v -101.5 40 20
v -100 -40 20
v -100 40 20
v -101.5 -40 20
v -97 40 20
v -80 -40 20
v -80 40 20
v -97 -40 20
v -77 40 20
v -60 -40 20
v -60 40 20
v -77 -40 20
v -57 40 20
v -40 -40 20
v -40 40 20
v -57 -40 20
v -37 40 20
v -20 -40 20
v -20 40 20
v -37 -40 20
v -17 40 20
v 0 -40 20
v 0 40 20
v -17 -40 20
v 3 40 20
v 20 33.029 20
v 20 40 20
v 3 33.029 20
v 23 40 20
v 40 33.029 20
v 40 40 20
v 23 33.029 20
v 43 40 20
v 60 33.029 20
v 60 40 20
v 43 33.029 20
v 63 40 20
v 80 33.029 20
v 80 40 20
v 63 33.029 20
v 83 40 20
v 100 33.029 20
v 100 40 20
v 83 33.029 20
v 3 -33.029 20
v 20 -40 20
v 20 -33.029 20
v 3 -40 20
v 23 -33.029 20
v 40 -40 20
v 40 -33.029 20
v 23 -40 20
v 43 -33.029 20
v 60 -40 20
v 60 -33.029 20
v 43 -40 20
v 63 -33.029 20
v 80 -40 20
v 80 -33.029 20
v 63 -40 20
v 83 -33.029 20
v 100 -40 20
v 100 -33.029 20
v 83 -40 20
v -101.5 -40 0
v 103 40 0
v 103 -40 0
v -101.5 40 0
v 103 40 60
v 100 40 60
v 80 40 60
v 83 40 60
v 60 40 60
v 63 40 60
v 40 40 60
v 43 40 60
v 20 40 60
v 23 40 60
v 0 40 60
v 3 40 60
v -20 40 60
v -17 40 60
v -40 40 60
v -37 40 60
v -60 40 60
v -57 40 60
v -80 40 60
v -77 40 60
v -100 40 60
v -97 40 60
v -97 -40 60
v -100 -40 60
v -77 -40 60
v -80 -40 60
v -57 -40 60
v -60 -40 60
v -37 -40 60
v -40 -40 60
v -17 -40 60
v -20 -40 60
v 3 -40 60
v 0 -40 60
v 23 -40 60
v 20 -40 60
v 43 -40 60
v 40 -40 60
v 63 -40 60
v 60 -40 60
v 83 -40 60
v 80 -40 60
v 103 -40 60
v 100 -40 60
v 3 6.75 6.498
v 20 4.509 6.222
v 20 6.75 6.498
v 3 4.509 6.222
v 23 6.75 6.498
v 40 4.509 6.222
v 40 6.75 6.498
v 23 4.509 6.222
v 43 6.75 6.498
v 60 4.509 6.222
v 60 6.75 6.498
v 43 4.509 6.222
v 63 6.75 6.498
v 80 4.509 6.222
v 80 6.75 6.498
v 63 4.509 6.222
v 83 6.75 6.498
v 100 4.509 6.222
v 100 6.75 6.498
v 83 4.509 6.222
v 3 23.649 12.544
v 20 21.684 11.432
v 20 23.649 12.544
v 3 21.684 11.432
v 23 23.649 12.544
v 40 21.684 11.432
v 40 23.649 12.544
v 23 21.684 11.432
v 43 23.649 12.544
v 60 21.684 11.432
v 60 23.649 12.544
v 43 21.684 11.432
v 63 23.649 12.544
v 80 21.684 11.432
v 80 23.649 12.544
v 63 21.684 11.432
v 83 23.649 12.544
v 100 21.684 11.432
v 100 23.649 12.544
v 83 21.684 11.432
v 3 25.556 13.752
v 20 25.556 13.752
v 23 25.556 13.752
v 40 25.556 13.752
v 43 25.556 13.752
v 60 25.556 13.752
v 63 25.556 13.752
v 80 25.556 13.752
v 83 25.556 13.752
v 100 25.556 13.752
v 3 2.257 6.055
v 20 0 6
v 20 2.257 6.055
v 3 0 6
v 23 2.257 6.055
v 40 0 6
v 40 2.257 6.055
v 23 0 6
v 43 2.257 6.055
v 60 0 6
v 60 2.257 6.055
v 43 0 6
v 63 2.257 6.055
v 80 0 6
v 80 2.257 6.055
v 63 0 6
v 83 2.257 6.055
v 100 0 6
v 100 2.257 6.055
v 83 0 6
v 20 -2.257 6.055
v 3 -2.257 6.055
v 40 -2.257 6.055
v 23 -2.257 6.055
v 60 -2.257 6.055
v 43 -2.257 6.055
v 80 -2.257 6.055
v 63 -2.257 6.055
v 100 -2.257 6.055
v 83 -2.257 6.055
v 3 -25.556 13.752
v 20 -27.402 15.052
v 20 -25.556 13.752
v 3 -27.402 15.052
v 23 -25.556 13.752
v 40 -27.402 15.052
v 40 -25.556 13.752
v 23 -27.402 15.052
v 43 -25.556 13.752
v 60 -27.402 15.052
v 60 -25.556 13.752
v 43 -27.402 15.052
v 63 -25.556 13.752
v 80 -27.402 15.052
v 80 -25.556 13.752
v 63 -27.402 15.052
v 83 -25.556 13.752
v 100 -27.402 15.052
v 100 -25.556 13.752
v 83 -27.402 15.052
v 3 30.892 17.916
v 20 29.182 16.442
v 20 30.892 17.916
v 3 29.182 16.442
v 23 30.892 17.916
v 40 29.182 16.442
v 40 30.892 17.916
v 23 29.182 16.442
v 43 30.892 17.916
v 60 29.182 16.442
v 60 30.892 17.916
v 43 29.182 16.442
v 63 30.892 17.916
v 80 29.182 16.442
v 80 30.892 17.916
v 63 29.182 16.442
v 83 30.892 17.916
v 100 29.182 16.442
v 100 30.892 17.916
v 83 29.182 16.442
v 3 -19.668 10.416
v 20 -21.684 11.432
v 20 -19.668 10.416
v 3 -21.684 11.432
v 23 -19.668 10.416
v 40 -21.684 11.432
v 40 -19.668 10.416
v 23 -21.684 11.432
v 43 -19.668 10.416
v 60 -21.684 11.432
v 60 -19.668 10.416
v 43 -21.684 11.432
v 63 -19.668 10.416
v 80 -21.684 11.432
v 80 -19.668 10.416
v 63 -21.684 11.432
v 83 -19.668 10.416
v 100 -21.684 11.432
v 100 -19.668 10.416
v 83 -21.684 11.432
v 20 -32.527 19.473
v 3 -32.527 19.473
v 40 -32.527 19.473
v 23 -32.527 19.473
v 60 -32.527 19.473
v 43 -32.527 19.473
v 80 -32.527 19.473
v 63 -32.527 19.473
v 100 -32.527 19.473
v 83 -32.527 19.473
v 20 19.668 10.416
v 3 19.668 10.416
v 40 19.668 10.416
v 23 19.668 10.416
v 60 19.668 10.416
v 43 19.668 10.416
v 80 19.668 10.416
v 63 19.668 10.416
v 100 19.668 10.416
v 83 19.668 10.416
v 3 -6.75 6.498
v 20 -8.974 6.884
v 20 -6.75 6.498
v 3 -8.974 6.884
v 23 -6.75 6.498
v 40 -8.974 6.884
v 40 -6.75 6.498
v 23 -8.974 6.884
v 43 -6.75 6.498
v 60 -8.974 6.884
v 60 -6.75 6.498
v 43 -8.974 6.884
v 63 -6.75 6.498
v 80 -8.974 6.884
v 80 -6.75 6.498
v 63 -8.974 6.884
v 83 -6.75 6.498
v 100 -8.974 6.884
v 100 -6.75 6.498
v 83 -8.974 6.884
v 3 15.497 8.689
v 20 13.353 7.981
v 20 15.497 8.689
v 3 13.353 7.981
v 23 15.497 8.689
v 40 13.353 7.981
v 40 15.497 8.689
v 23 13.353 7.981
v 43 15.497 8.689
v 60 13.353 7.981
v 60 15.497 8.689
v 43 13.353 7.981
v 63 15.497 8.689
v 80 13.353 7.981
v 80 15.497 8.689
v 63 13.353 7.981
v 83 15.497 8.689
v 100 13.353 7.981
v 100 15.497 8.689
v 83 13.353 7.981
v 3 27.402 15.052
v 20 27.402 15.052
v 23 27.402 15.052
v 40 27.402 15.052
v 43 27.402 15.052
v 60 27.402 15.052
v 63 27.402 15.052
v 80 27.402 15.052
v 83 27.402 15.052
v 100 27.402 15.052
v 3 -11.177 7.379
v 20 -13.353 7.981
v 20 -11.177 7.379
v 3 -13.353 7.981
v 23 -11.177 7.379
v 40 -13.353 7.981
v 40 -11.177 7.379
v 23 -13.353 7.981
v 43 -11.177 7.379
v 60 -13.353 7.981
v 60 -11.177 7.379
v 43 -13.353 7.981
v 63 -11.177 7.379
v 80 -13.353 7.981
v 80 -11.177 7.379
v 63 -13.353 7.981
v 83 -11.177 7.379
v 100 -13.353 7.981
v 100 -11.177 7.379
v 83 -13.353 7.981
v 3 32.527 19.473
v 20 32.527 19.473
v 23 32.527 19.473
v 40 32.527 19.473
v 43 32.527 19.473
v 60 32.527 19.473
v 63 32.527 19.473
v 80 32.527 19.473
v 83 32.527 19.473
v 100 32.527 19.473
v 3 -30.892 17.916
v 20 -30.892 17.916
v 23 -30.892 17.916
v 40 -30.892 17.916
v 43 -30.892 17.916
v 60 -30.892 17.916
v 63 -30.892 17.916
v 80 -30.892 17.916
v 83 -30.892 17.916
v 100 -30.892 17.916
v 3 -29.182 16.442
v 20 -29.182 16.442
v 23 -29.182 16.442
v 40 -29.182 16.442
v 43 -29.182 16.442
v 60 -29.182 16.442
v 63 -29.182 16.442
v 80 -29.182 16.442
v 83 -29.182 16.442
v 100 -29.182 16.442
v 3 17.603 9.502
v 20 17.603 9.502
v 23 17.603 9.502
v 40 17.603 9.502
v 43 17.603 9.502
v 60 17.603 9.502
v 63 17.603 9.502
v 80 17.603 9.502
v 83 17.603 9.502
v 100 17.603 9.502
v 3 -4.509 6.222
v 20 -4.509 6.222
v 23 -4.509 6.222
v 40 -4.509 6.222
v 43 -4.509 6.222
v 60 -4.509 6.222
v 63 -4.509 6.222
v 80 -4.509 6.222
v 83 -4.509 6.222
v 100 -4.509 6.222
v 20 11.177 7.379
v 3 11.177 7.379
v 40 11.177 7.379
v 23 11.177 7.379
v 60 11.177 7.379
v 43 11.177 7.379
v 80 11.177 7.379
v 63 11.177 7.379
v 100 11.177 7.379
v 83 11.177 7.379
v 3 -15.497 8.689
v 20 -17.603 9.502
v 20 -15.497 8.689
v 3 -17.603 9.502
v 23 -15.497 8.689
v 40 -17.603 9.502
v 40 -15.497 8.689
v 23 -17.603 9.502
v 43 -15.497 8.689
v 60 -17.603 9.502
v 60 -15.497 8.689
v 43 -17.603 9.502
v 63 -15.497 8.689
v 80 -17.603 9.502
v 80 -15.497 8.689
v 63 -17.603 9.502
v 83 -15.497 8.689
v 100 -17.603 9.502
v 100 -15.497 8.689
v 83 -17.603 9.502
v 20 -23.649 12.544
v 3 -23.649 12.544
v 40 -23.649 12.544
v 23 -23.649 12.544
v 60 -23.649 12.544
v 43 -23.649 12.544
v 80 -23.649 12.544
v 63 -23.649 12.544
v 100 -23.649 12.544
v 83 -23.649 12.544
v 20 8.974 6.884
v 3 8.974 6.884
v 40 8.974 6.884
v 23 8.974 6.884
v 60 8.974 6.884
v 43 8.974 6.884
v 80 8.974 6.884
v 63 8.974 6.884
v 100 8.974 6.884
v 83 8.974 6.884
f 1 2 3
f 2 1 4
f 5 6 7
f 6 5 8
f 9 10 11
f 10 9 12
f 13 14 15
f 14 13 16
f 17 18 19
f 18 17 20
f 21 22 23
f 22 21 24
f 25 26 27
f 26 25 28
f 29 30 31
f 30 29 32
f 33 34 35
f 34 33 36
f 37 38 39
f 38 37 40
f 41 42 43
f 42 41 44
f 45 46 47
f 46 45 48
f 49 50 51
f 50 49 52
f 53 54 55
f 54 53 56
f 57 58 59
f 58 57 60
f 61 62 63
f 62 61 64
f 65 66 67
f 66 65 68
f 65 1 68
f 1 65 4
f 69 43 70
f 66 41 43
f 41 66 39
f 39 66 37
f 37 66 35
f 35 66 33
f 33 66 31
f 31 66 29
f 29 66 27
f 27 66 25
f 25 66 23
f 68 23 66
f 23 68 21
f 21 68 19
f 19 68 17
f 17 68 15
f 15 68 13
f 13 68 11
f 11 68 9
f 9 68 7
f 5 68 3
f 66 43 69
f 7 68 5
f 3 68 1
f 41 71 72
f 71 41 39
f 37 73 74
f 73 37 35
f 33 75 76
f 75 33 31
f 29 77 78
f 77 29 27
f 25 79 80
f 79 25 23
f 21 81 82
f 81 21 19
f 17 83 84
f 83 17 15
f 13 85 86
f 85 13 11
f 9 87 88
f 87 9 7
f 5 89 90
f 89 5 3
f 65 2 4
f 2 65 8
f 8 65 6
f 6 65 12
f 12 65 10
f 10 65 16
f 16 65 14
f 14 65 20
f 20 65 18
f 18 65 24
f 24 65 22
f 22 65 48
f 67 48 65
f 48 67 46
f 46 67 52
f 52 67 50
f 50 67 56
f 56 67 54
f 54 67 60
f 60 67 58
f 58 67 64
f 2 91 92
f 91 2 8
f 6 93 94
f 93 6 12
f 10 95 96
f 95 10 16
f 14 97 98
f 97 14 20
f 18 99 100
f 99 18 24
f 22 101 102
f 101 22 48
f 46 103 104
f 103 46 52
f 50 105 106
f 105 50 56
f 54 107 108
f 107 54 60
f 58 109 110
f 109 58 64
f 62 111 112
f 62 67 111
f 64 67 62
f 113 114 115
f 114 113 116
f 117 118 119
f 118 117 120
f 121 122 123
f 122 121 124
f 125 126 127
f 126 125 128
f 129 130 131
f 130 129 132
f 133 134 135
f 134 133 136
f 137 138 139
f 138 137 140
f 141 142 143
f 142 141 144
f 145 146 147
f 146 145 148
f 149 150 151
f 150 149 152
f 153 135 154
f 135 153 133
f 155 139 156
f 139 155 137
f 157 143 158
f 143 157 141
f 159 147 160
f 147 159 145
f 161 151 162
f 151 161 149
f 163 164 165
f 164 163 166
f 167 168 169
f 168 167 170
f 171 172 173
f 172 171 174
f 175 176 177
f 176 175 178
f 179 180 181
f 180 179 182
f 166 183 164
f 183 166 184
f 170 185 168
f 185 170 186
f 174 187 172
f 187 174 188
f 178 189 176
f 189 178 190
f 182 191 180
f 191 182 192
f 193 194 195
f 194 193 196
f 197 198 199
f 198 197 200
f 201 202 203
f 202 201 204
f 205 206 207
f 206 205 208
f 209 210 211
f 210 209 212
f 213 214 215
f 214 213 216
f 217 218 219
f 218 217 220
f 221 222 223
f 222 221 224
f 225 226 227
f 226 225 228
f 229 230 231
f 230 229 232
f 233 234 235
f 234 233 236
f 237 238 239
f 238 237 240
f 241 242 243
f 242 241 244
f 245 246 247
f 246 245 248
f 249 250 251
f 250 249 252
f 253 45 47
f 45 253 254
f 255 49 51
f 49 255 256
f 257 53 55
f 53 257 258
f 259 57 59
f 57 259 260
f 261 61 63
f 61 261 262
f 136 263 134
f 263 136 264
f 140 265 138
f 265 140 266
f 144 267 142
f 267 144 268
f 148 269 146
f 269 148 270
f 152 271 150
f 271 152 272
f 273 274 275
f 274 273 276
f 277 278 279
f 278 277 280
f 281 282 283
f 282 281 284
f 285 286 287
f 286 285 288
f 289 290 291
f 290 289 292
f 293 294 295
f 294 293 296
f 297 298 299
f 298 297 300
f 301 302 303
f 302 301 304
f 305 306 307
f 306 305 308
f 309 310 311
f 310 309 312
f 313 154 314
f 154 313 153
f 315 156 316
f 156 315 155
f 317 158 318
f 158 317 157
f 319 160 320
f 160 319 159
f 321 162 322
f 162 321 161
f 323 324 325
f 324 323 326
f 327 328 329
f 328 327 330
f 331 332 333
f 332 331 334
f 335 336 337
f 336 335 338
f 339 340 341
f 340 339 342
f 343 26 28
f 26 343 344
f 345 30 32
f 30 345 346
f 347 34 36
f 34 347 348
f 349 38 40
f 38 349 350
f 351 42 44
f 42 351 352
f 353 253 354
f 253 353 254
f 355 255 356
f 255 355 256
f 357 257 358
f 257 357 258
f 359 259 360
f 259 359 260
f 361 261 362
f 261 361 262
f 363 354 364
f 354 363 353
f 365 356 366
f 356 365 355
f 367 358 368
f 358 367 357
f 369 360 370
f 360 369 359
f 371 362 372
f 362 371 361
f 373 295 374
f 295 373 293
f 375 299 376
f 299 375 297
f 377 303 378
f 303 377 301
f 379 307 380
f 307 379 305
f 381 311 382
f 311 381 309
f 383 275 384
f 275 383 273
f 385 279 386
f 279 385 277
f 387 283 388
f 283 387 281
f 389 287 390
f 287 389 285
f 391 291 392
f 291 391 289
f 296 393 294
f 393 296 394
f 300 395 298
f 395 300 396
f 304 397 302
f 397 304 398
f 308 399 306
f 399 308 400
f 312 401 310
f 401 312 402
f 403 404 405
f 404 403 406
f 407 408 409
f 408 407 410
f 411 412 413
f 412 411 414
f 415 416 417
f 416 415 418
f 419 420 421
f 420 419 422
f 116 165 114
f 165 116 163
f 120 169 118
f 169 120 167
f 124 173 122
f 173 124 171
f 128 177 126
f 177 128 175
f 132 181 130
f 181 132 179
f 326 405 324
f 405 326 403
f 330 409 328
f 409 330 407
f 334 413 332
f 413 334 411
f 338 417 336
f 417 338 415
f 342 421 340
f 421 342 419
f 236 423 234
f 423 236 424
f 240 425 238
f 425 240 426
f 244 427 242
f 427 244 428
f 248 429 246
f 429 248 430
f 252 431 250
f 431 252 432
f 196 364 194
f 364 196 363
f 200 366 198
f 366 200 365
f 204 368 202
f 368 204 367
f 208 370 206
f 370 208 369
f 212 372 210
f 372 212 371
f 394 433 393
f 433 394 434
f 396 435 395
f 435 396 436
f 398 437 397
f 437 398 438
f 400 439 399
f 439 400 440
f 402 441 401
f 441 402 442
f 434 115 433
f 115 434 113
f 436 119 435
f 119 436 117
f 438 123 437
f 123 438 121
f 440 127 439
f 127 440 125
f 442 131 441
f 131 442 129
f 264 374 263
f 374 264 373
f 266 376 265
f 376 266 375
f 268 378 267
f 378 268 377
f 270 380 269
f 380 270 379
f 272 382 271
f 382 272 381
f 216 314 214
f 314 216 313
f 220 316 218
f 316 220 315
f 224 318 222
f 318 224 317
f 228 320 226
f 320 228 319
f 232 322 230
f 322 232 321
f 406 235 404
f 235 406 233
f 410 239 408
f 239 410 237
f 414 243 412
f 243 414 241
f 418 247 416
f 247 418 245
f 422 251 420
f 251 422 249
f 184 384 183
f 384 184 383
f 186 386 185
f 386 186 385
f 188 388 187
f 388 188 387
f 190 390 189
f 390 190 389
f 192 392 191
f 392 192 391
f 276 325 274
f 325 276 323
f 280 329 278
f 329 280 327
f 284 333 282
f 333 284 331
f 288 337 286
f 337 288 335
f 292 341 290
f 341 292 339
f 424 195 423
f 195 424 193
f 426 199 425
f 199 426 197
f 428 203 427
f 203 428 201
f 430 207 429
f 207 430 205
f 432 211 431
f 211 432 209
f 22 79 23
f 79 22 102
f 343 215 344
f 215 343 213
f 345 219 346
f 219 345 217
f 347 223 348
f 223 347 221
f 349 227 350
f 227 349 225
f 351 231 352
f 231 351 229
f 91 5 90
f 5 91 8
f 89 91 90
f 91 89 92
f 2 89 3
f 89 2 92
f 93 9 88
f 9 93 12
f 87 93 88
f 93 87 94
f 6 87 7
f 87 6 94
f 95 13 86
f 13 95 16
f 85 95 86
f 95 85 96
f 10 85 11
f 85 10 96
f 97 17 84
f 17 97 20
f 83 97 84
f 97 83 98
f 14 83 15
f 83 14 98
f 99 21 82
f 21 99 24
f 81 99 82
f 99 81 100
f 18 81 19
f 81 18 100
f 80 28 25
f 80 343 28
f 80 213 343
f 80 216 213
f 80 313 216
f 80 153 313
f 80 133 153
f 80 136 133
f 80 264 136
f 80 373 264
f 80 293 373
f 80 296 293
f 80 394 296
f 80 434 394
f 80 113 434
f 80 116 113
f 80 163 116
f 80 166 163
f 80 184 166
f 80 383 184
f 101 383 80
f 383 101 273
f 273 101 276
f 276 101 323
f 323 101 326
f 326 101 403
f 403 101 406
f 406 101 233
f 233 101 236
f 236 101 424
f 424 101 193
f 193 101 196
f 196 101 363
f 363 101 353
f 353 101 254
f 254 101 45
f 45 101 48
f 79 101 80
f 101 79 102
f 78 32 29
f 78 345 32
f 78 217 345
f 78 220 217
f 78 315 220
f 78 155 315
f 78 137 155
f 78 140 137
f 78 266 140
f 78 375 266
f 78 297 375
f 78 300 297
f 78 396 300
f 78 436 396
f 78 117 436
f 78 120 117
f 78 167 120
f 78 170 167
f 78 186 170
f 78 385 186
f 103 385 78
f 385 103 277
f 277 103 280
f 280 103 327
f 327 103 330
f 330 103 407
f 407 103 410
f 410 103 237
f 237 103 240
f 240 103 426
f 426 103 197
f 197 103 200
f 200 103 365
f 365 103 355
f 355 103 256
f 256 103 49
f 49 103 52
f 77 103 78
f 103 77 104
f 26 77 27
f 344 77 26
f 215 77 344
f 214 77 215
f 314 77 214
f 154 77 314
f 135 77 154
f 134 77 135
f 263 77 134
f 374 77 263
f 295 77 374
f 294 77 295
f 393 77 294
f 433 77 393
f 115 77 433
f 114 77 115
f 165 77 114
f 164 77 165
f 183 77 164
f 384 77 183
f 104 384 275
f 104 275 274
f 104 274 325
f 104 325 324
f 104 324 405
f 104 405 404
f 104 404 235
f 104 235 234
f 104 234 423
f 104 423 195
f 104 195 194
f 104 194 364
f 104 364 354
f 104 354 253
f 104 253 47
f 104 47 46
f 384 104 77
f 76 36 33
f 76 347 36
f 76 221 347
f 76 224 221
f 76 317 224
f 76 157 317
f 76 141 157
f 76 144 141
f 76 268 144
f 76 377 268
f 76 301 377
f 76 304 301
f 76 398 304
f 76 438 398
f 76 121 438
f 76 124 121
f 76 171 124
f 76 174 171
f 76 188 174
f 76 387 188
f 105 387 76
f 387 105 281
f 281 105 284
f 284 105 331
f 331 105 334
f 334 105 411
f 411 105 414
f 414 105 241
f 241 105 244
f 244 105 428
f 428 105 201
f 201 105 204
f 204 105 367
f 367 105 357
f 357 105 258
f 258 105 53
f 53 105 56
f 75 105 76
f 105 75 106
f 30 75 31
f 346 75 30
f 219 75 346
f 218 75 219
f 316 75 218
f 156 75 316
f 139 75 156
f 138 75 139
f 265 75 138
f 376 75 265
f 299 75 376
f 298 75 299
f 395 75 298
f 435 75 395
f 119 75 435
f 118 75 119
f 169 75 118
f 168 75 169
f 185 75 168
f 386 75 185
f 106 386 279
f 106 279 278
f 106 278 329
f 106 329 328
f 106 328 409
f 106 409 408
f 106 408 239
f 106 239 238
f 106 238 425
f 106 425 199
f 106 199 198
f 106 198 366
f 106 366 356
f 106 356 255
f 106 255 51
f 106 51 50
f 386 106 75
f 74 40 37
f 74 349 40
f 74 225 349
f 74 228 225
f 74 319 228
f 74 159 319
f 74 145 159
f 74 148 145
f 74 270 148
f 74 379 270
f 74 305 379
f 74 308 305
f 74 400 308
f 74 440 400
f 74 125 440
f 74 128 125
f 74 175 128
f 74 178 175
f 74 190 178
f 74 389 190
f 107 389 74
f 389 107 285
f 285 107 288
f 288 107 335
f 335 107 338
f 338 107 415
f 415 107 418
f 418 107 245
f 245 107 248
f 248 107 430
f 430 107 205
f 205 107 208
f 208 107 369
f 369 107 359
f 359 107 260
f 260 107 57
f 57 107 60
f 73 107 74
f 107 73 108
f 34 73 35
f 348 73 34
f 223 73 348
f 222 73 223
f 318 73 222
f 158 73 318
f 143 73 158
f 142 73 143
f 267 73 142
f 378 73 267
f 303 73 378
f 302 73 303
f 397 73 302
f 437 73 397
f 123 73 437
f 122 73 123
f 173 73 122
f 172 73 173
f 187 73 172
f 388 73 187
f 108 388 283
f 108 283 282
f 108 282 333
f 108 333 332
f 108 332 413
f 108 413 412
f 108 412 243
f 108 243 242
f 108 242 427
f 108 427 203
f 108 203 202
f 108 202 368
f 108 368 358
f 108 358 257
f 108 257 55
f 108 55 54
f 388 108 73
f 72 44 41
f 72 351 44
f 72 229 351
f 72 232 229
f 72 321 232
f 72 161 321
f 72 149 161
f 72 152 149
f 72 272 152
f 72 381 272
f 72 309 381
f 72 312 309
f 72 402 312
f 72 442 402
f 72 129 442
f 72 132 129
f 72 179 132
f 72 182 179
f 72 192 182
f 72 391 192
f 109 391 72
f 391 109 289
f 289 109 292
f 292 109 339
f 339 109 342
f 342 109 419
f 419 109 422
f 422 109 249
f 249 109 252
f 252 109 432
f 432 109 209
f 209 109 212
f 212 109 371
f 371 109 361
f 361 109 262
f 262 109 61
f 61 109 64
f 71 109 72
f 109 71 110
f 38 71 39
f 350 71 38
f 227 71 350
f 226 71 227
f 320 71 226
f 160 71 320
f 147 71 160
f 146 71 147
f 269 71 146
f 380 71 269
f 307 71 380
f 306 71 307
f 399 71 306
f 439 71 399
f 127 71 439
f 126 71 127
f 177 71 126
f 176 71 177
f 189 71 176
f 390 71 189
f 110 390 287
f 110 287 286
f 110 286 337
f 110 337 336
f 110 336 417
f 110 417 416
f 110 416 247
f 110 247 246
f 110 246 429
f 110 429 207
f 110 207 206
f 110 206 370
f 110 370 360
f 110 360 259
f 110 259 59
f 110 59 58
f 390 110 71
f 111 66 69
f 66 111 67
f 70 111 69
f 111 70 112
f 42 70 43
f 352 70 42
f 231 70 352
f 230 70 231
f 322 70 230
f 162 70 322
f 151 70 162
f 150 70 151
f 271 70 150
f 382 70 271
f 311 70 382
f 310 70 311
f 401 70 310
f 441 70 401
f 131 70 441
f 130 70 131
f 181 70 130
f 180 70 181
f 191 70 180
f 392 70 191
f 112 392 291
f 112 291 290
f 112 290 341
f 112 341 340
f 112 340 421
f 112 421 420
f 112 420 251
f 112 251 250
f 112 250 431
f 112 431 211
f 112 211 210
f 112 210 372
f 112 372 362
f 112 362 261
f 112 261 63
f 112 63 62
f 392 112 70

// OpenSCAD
// Petri Dish Rack
// Designed for 90mm diameter dishes standing on edge.

// --- Dimensions ---
base_l      = 203;    // Length of base (X)
base_w      = 80;     // Width of base (Y)
base_h      = 20;     // Height of base (Z)

dish_radius = 45;     // Radius of 90mm dish
cradle_r    = 46;     // Radius of the cradle cut
cradle_z    = 52;     // Z-coordinate of the cradle cylinder axis
// cradle_bottom = cradle_z - cradle_r = 6mm

num_dividers = 11;    // Number of divider plates
divider_t    = 3;     // Thickness of dividers (X)
divider_h    = 60;    // Height of dividers (Z)
divider_spacing = 20; // Distance between divider centers (X)

$fn = 128;

// --- Geometry Construction ---

// The base block
module base() {
    // Centered on X and Y, sits on Z=0
    translate([-base_l / 2, -base_w / 2, 0])
        cube([base_l, base_w, base_h]);
}

// The divider plates
module dividers() {
    // Dividers are placed at x = -100, -80, ..., 100
    // Formula for center: (i - (n-1)/2) * spacing
    for (i = [0 : num_dividers - 1]) {
        x_pos = (i - (num_dividers - 1) / 2) * divider_spacing;
        // Dividers are 80mm wide (Y) and 60mm tall (Z)
        // They are centered on Y (from -40 to 40)
        translate([x_pos, -base_w / 2, 0])
            cube([divider_t, base_w, divider_h]);
    }
}

// The cradle cut (cylindrical groove)
// The axis runs along X, at y=0, z=52.
module cradle_cut() {
    // Cylinder axis is parallel to X. 
    // We rotate 90 deg around Y to align cylinder axis with X.
    // We translate to the specified axis position (y=0, z=52).
    translate([0, 0, cradle_z])
        rotate([0, 90, 0])
            cylinder(h = base_l + 2, r = cradle_r);
}

// --- Final Assembly ---

// The specification states:
// 1. A curved cradle is cut along the whole length of the base.
// 2. Eleven solid divider plates rise from z=0 to z=60.
// 3. The cradle is NOT cut through the dividers.
// This implies: Part = (Base - Cradle) + Dividers.

union() {
    // 1. The Base with the cradle cut out
    difference() {
        base();
        cradle_cut();
    }
    
    // 2. The Dividers (added as solid, so they are not cut by the cradle)
    dividers();
}
